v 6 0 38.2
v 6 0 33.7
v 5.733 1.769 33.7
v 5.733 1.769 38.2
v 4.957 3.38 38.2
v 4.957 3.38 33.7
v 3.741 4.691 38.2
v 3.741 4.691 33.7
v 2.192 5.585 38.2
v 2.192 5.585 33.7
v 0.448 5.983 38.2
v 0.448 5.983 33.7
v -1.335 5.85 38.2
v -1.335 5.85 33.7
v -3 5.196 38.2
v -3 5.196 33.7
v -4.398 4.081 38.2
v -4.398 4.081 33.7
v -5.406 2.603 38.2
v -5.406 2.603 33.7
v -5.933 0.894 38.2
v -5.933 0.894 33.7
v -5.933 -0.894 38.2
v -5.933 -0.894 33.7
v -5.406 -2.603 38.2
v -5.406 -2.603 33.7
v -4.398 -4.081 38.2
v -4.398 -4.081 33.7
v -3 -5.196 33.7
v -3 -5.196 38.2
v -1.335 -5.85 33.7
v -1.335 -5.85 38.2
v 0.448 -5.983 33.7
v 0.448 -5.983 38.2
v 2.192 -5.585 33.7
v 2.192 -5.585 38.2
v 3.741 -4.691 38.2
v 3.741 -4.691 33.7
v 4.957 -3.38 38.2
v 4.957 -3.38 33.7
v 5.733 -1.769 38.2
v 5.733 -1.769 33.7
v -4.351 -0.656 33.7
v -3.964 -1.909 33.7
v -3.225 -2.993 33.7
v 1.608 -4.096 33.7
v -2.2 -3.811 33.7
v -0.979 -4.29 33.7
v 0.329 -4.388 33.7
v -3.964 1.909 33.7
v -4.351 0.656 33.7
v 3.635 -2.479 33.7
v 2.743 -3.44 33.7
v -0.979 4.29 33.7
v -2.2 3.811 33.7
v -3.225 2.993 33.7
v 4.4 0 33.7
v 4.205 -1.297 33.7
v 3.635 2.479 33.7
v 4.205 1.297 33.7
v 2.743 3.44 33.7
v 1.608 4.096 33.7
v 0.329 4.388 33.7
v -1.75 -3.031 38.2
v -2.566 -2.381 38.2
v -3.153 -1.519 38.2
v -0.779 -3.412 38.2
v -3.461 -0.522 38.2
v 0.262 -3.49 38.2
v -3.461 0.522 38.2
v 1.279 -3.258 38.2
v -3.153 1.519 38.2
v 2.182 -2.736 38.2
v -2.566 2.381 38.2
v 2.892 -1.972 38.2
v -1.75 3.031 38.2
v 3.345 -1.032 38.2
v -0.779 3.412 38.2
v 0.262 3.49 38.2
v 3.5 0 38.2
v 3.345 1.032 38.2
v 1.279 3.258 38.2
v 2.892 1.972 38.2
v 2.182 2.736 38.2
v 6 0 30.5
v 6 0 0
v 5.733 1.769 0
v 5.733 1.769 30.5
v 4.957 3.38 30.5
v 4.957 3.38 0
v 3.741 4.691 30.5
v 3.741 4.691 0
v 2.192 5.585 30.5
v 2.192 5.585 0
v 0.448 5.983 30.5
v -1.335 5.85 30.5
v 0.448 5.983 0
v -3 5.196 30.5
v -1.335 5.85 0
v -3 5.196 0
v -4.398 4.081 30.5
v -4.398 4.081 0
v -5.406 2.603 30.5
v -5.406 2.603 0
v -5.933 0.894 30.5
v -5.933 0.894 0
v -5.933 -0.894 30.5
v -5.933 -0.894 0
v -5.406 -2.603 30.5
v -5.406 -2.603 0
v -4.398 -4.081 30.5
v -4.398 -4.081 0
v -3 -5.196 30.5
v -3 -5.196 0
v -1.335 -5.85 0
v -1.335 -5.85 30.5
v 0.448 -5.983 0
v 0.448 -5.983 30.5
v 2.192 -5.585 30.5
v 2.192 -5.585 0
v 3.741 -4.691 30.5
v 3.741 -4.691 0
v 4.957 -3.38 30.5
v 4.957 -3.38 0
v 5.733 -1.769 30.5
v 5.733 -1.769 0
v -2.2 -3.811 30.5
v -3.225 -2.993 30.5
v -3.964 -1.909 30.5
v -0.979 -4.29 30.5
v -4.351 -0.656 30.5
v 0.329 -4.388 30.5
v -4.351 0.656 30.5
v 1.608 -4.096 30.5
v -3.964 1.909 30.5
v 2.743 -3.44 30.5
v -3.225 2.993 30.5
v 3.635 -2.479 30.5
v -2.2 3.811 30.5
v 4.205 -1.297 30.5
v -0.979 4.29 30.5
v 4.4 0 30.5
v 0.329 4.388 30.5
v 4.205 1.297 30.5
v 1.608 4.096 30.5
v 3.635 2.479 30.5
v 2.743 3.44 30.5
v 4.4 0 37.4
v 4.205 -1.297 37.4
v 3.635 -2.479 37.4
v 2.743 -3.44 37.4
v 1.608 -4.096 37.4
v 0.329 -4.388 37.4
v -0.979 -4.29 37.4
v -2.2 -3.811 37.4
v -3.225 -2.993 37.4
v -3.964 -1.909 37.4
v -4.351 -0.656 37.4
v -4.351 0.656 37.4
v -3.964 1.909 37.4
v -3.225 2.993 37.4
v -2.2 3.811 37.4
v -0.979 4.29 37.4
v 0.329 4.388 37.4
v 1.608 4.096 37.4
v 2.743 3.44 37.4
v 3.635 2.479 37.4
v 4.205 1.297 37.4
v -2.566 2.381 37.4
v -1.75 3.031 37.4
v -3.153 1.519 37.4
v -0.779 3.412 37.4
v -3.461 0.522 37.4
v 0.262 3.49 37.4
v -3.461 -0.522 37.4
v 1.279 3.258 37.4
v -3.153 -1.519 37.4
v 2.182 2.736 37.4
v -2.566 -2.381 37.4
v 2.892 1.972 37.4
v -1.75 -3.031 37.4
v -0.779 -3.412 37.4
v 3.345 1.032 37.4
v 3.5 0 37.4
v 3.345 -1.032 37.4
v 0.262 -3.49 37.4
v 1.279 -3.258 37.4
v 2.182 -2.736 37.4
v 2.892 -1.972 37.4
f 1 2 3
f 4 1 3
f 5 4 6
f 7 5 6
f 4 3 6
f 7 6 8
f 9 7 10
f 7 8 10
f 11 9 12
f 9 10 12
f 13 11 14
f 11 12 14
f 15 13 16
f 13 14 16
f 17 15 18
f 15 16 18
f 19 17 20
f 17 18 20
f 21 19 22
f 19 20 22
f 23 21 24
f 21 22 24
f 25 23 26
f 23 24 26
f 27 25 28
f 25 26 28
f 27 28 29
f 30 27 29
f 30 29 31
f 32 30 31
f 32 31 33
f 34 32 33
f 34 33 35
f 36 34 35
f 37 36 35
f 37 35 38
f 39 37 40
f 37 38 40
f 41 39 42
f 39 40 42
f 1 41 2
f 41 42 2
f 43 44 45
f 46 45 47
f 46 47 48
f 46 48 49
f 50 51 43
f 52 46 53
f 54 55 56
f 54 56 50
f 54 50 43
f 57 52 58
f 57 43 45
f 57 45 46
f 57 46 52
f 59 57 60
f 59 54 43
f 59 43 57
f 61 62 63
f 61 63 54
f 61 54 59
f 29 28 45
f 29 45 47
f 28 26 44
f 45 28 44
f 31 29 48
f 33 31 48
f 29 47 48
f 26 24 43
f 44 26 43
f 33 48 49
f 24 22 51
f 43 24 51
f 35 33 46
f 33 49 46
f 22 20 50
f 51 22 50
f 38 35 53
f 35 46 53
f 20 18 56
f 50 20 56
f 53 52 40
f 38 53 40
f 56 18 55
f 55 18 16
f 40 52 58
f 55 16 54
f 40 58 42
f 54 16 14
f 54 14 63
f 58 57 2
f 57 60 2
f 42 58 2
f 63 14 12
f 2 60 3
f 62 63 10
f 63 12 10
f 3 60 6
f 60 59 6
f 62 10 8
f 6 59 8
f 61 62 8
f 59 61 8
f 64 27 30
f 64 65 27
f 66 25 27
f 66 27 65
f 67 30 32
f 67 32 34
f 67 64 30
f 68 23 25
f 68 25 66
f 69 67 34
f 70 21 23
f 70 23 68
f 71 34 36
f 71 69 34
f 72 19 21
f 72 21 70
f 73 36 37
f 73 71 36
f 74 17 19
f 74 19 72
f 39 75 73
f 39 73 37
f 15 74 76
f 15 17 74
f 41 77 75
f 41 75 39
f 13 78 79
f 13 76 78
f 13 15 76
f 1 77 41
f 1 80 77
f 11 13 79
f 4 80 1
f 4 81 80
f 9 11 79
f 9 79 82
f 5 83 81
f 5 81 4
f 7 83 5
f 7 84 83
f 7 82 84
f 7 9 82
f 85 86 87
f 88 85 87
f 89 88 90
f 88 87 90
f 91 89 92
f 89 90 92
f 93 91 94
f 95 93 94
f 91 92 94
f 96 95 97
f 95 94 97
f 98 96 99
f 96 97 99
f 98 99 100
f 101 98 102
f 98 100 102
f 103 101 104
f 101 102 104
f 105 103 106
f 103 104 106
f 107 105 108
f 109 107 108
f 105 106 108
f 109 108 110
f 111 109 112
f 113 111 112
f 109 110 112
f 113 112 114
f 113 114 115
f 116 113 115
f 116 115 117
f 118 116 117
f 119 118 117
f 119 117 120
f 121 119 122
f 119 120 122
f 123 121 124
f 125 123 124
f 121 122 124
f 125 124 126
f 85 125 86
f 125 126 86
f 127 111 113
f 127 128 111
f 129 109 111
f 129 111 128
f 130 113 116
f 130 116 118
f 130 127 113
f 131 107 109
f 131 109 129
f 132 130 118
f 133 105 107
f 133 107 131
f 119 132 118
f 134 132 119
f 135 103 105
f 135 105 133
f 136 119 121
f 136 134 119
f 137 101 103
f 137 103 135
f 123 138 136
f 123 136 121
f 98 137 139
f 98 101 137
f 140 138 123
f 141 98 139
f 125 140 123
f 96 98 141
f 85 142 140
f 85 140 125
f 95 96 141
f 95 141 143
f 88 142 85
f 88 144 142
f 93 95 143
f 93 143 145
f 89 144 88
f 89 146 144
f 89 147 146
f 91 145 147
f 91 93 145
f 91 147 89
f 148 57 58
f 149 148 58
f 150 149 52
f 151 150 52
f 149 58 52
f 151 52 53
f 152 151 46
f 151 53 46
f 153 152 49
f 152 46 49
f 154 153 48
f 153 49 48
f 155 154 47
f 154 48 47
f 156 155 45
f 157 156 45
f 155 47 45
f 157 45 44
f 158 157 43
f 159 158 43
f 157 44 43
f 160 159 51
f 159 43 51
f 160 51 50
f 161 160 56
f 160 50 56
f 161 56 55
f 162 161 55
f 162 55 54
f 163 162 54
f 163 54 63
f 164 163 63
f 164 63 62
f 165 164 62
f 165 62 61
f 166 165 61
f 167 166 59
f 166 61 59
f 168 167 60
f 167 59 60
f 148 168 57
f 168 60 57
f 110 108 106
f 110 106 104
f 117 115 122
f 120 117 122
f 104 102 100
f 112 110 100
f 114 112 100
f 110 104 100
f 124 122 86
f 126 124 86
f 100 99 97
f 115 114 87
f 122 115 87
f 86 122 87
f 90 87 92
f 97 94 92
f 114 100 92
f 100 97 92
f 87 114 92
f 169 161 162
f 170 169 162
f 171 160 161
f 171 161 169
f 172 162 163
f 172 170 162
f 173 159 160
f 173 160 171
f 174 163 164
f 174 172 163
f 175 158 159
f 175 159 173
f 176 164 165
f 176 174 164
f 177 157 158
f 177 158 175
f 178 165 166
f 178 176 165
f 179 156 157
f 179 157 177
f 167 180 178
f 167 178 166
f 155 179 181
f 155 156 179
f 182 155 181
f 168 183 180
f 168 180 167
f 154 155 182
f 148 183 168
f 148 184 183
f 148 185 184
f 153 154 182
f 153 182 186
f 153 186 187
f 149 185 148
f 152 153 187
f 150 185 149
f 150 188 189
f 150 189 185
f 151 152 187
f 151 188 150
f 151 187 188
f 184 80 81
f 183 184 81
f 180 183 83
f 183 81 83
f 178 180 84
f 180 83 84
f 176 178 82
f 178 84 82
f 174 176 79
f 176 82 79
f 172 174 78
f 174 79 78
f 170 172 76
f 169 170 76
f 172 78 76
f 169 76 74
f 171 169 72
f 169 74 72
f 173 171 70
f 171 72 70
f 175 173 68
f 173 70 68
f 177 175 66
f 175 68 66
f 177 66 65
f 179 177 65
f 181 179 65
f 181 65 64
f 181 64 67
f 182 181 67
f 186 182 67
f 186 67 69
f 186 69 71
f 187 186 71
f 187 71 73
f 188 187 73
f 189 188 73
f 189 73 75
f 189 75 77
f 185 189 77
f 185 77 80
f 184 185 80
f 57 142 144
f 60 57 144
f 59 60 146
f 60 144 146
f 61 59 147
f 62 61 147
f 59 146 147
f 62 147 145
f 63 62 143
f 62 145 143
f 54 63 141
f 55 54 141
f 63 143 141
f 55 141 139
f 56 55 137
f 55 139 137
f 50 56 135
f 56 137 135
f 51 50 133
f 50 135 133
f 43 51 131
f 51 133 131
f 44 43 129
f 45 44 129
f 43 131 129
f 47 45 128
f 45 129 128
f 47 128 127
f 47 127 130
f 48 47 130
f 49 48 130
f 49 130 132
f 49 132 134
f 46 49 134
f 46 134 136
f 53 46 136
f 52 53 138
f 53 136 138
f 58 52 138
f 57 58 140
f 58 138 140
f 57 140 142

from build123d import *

# Parameters (mm, degrees)
F0_R     = 6
F1_DEPTH = 30.5
F2_R     = 4.4
F3_DEPTH = 3.2
F4_R     = 6
F5_DEPTH = 4.5
F6_R     = 4.4
F7_DEPTH = 3.7
F8_R     = 3.5
F9_DEPTH = 1


with BuildPart() as f1:
    # F0 (on Top) → F1 (new body)
    with BuildSketch(Plane.XY):
        Circle(F0_R)
    extrude(amount=F1_DEPTH)

    # F2 (on face) → F3 (join)
    with BuildSketch(Plane.XY.offset(30.5)):
        Circle(F2_R)
    extrude(amount=F3_DEPTH)


with BuildPart() as f5:
    # F4 (on face) → F5 (new body)
    with BuildSketch(Plane.XY.offset(33.7)):
        Circle(F4_R)
    extrude(amount=F5_DEPTH)

    # F6 (on face) → F7 (cut)
    with BuildSketch(Plane(origin=(0, 0, 33.7), x_dir=(1, 0, 0), z_dir=(0, 0, -1))):
        Circle(F6_R)
    extrude(amount=-F7_DEPTH, mode=Mode.SUBTRACT)

    # F8 (on face) → F9 (cut)
    with BuildSketch(Plane.XY.offset(38.2)):
        Circle(F8_R)
    extrude(amount=-F9_DEPTH, mode=Mode.SUBTRACT)


solid = Compound([f1.part, f5.part])
